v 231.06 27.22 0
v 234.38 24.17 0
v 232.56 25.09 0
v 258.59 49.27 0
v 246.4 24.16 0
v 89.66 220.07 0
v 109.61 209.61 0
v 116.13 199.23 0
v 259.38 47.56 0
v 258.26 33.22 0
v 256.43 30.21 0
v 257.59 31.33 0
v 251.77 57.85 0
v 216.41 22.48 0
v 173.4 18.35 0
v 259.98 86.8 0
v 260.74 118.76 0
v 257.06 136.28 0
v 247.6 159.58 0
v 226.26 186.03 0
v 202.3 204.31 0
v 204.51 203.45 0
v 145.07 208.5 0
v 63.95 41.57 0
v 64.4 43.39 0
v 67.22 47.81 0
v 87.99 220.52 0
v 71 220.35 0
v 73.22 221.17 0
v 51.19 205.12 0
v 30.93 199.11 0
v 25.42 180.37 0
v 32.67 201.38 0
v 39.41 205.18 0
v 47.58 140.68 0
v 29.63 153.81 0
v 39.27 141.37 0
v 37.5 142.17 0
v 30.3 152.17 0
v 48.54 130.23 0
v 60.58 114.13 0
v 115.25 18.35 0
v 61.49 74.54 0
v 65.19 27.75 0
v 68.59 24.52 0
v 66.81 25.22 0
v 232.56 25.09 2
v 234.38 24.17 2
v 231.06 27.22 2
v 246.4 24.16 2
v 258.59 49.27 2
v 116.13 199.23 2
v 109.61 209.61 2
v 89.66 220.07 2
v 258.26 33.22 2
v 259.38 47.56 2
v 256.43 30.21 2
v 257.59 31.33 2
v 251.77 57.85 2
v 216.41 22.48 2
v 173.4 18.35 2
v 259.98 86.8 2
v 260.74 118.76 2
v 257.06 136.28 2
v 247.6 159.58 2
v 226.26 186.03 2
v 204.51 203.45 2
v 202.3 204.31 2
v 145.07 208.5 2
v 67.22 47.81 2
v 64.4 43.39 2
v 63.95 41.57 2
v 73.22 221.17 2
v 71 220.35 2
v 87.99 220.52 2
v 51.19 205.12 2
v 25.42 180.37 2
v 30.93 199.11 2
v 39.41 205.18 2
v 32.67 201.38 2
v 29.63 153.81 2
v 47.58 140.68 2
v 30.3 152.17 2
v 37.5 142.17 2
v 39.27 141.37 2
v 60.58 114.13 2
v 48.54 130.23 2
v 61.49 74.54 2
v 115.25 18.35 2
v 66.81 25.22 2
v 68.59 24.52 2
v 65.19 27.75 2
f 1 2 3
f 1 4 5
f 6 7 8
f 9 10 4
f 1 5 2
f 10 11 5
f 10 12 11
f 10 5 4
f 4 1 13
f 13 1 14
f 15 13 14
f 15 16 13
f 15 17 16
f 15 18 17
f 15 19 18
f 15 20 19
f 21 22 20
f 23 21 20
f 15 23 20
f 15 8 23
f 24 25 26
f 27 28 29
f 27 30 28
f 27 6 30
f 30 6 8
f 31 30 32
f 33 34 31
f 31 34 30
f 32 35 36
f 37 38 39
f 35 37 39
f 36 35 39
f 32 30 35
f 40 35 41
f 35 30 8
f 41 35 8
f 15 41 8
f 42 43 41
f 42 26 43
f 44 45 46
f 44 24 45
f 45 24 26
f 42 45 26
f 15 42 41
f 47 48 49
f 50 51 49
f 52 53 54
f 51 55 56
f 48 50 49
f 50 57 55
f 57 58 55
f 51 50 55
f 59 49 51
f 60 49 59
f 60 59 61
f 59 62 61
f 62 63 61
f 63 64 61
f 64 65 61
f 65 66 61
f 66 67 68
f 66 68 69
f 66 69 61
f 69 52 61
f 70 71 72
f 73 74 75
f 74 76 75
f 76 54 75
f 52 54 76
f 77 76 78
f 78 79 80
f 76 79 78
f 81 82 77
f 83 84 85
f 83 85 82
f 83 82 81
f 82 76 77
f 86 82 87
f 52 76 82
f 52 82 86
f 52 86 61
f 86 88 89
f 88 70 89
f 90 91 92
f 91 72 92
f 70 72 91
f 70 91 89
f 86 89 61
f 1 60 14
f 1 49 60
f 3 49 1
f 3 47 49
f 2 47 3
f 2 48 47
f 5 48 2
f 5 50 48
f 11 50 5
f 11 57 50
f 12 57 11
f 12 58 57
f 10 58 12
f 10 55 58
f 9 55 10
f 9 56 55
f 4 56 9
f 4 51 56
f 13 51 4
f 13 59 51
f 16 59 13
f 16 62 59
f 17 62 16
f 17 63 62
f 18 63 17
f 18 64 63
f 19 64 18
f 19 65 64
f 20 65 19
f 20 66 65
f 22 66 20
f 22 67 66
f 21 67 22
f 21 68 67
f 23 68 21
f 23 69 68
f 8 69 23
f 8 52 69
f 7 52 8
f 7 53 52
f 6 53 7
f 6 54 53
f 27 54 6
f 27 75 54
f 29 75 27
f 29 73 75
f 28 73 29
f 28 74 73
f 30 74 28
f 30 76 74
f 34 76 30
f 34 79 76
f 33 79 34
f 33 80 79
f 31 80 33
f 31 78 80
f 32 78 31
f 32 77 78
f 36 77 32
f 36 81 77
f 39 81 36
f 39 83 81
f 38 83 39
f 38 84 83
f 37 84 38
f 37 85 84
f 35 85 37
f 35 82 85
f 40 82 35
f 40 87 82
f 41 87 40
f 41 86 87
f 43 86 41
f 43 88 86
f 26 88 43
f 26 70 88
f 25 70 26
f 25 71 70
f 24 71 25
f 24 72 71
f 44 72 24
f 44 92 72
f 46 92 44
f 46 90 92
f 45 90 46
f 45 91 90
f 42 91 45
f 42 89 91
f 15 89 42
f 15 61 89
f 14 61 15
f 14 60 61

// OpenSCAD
// ============================================================================
// 🏰 Main Street Electrical Parade (WDW 10K) - 3D TPU Armor Plate (FRONT)
// Dimensions: 235.32mm x 202.82mm x 10.0mm
// Sized for Snapmaker U1 & Bambu Lab | Material: 95A TPU
// Aperture: Ø 3.4mm round optical apertures (Default) | Orientation: horizontal
// ============================================================================
$fn = 24;
front_thickness = 2.0;
total_thickness = 10.0;
contour_pts = [[32.67, 201.38], [39.41, 205.18], [51.19, 205.12], [71.0, 220.35], [73.22, 221.17], [87.99, 220.52], [89.66, 220.07], [109.61, 209.61], [116.13, 199.23], [145.07, 208.5], [202.3, 204.31], [204.51, 203.45], [226.26, 186.03], [247.6, 159.58], [257.06, 136.28], [260.74, 118.76], [259.98, 86.8], [251.77, 57.85], [258.59, 49.27], [259.38, 47.56], [258.26, 33.22], [257.59, 31.33], [256.43, 30.21], [246.4, 24.16], [234.38, 24.17], [232.56, 25.09], [231.06, 27.22], [216.41, 22.48], [173.4, 18.35], [115.25, 18.35], [68.59, 24.52], [66.81, 25.22], [65.19, 27.75], [63.95, 41.57], [64.4, 43.39], [67.22, 47.81], [61.49, 74.54], [60.58, 114.13], [48.54, 130.23], [47.58, 140.68], [39.27, 141.37], [37.5, 142.17], [30.3, 152.17], [29.63, 153.81], [25.42, 180.37], [30.93, 199.11], [32.67, 201.38]];
ordered_leds = [[160.08, 47.11], [143.04, 33.59], [124.97, 39.26], [110.82, 49.36], [105.38, 35.37], [86.17, 39.52], [86.63, 53.58], [83.83, 67.71], [81.94, 81.77], [83.36, 95.76], [83.79, 109.76], [76.13, 123.62], [69.05, 137.55], [58.65, 150.48], [49.26, 164.01], [61.77, 176.68], [51.36, 189.69], [70.27, 194.57], [85.33, 203.09], [89.28, 188.3], [82.36, 174.36], [69.85, 162.96], [80.52, 149.89], [89.55, 134.3], [97.05, 120.38], [109.5, 132.06], [100.37, 146.98], [95.35, 160.98], [102.53, 174.89], [116.47, 184.8], [129.36, 173.45], [115.36, 163.61], [120.22, 149.68], [136.54, 142.69], [129.36, 128.76], [135.8, 112.46], [138.91, 94.17], [151.86, 105.4], [148.42, 124.08], [155.4, 138.0], [162.36, 151.93], [159.2, 165.93], [140.39, 160.91], [147.95, 178.46], [135.38, 189.81], [156.49, 192.47], [168.22, 179.52], [179.57, 191.8], [196.36, 185.0], [185.01, 172.59], [182.32, 154.7], [175.3, 140.65], [195.42, 143.02], [187.71, 129.16], [168.7, 124.8], [170.44, 110.75], [166.85, 96.56], [153.86, 85.4], [138.33, 77.68], [120.9, 85.93], [122.07, 100.78], [116.36, 116.22], [103.11, 105.33], [102.64, 91.4], [100.99, 77.34], [103.17, 63.29], [119.42, 71.8], [125.88, 57.81], [139.81, 47.84], [143.72, 63.68], [163.78, 61.17], [180.42, 38.34], [178.62, 52.4], [182.74, 66.59], [167.64, 75.23], [180.53, 86.32], [195.42, 77.81], [204.44, 64.34], [198.63, 50.29], [200.69, 36.22], [220.13, 39.98], [218.23, 54.05], [233.48, 61.84], [236.13, 75.82], [215.95, 76.69], [219.18, 90.74], [198.8, 91.8], [188.23, 104.67], [199.54, 117.21], [210.2, 104.41], [219.49, 119.14], [213.95, 133.26], [200.27, 160.64], [209.51, 174.05], [220.6, 161.24], [214.59, 147.25], [234.96, 136.23], [239.19, 122.16], [239.45, 89.83], [230.47, 106.58]];
fastener_tabs = [[31.94, 202.69], [74.88, 222.6], [116.74, 201.07], [161.98, 208.77], [209.78, 201.15], [243.85, 166.62], [261.71, 121.44], [257.58, 72.85], [255.84, 28.1], [210.3, 20.39], [161.86, 16.85], [113.22, 17.11], [64.83, 25.54], [60.34, 72.73], [54.99, 119.1], [28.03, 154.36]];

linear_extrude(front_thickness) polygon(contour_pts);
